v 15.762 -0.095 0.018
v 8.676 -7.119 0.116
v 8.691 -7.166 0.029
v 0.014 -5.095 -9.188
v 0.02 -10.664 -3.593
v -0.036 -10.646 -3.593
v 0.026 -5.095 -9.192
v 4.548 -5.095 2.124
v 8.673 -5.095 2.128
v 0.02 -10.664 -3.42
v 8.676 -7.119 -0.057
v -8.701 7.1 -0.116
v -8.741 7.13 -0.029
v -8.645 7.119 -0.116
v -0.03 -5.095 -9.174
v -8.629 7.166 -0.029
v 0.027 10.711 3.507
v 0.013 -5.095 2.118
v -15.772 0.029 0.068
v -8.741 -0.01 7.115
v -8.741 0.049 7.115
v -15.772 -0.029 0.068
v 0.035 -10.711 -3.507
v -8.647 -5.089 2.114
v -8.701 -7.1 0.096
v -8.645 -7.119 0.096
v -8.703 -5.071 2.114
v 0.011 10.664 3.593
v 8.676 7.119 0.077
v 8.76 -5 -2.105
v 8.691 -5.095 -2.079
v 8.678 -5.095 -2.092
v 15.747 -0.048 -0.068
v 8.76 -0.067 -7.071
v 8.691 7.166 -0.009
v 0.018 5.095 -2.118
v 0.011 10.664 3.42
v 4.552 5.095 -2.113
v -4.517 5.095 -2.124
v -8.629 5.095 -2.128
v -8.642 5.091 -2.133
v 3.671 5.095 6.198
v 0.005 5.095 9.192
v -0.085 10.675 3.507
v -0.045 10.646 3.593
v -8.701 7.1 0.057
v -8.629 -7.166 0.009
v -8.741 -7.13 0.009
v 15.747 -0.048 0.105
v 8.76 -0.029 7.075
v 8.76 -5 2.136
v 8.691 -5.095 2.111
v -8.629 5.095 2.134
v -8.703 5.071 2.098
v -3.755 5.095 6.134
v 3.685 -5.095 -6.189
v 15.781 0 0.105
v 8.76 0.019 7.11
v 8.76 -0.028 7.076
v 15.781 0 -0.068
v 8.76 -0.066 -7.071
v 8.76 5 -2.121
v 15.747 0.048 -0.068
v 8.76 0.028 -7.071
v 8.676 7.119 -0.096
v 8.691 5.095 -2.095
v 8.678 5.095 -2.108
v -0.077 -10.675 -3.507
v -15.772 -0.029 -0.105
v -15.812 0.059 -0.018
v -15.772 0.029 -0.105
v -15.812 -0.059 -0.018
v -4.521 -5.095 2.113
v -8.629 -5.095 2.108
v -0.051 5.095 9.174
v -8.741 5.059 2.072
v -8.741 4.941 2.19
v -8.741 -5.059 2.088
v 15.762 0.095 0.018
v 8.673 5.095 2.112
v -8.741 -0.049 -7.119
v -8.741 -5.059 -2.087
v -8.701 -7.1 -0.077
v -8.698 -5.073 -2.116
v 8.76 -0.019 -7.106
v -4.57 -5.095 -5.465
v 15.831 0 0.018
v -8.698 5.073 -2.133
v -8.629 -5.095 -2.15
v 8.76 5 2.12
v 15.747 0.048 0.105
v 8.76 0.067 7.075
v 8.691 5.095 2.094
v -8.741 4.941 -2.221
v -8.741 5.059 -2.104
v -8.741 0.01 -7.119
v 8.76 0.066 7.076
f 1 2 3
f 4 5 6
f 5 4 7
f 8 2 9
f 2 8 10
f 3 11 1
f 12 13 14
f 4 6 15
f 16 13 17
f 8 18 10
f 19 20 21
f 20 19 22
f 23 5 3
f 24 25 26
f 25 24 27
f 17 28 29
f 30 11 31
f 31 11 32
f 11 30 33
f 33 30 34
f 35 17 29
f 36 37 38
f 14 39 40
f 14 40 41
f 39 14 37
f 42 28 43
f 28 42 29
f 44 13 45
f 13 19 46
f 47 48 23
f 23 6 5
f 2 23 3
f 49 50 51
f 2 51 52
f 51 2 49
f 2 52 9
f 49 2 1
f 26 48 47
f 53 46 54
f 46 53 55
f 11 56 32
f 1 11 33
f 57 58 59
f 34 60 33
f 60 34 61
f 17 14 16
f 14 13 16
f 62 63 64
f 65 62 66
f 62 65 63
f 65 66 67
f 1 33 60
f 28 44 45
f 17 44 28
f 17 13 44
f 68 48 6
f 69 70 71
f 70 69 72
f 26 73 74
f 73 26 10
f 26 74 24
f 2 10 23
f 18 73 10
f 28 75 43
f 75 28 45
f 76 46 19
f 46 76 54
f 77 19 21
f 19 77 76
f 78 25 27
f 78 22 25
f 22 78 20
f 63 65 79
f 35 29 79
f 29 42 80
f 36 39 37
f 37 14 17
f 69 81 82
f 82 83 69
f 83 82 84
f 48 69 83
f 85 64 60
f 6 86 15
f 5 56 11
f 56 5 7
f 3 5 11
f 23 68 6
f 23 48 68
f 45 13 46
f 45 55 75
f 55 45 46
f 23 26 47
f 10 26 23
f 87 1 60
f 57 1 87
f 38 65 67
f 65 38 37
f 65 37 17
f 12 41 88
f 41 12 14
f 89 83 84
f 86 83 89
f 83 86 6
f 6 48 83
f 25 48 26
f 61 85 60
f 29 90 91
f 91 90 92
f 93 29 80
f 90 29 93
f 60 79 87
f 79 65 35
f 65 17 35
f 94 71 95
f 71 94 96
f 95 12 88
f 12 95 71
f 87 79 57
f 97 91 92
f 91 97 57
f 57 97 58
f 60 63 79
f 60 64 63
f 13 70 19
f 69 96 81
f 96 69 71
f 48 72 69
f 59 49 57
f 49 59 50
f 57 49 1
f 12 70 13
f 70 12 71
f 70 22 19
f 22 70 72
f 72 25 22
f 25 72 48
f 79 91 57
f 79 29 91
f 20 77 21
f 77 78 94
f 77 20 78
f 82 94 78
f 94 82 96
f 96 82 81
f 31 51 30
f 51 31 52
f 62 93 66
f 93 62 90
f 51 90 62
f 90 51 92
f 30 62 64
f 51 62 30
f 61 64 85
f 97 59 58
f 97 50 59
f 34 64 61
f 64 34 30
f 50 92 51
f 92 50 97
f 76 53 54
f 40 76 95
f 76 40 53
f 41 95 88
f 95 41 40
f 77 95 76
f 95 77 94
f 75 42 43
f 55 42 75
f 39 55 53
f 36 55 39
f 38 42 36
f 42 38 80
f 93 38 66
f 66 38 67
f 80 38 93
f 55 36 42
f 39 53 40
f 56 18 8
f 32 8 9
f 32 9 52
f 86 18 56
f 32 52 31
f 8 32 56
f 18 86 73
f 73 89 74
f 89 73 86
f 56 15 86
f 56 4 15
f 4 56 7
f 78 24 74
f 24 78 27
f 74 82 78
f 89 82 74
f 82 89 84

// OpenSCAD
// Auto-generated OpenSCAD file

    inner_points = 10*[[0.8660275601949093, -0.49999626496864946, -0.5000000000002527], [0.8660232473576305, 0.5000037350220502, -0.5000000000001439], [2.1564184105024137e-06, -0.49999999999524114, -1.0000000000000544], [-2.156418868470349e-06, 0.4999999999954585, -0.9999999999999456], [2.156418868470349e-06, -0.4999999999954585, 0.9999999999999456], [-2.1564184105024137e-06, 0.49999999999524114, 1.0000000000000544], [-0.8660232473576305, -0.5000037350220502, 0.5000000000001439], [-0.8660275601949093, 0.49999626496864946, 0.5000000000002527], [0.8660275601951383, -0.49999626496875815, 0.49999999999974737], [0.8660232473578595, 0.5000037350219414, 0.4999999999998561], [-0.8660232473578595, -0.5000037350219414, -0.4999999999998561], [-0.8660275601951383, 0.49999626496875815, -0.49999999999974737], [0.7865660924778658, 3.3923317141515653e-06, -1.3623724356959748], [-0.7865660924778658, -3.3923317141515653e-06, 1.3623724356959748]];

    outer_points = 10*[[0.8668436236259911, -0.0019279514490723182, -0.7061008534070546], [0.8660225906704068, -0.707104152868027, 0.002930775546985575], [0.866027055663365, 0.707104152868027, -0.0009251247660098337], [0.8652060227077807, 0.0019279514490723182, 0.7081065041880305], [-0.8652060227077807, -0.0019279514490723182, -0.7081065041880305], [-0.866027055663365, -0.707104152868027, 0.0009251247660098337], [-0.8660225906704068, 0.707104152868027, -0.002930775546985575], [-0.8668436236259911, 0.0019279514490723182, 0.7061008534070546], [0.0012270844404182679, -0.35644400360762196, -1.0596915431180651], [0.0004060514848339595, -1.0616202050265766, -0.3506599141640247], [-0.0004060514848339595, 1.0616202050265766, 0.3506599141640247], [-0.0012270844404182679, 0.35644400360762196, 1.0596915431180651], [1.573131130281187, 0.0, 0.0018216288930887289], [-1.573131130281187, 0.0, -0.0018216288930887289]];

    // Convex hull for inner set (I)
    module inner_hull() {
        hull() {
            for (p = inner_points) {
                translate(p) sphere(r=0.1);
            }
        }
    }

    // Convex hull for outer set (O) minus inner hull (O \ I)
    module outer_minus_inner() {
        difference() {
            hull() {
                for (p = outer_points) {
                    translate(p) sphere(r=0.1);
                }
            }
            inner_hull(); // Subtract inner hull
        }
    }

    // Convex hull for outer set (O) minus all translated inner hulls
    module outer_minus_AllTranslationInner() {
        difference() {
            hull() {
                for (p = outer_points) {
                    translate(p) sphere(r=0.1);
                }
            }
            hull() {
                translate([0,0,50]) inner_hull();
                translate([0,0,-50]) inner_hull();
            }; // Subtract translated inner hulls
        }
    }

    // Difference between outer_minus_inner and outer_minus_AllTranslationInner
    module outer_minus_inner_diff() {
        difference() {
            // Outer minus inner
            difference() {
                hull() {
                    for (p = outer_points) {
                        translate(p) sphere(r=0.1);
                    }
                }
                inner_hull();
            }

            // Subtract Outer minus AllTranslationInner
            difference() {
                hull() {
                    for (p = outer_points) {
                        translate(p) sphere(r=0.1);
                    }
                }
                hull() {
                    translate([0,0,50]) inner_hull();
                    translate([0,0,-50]) inner_hull();
                };
            }
        }
    }

    // Rendering all with colors applied
    color([0, 1, 0, 1]) outer_minus_AllTranslationInner(); // Opaque green
    
